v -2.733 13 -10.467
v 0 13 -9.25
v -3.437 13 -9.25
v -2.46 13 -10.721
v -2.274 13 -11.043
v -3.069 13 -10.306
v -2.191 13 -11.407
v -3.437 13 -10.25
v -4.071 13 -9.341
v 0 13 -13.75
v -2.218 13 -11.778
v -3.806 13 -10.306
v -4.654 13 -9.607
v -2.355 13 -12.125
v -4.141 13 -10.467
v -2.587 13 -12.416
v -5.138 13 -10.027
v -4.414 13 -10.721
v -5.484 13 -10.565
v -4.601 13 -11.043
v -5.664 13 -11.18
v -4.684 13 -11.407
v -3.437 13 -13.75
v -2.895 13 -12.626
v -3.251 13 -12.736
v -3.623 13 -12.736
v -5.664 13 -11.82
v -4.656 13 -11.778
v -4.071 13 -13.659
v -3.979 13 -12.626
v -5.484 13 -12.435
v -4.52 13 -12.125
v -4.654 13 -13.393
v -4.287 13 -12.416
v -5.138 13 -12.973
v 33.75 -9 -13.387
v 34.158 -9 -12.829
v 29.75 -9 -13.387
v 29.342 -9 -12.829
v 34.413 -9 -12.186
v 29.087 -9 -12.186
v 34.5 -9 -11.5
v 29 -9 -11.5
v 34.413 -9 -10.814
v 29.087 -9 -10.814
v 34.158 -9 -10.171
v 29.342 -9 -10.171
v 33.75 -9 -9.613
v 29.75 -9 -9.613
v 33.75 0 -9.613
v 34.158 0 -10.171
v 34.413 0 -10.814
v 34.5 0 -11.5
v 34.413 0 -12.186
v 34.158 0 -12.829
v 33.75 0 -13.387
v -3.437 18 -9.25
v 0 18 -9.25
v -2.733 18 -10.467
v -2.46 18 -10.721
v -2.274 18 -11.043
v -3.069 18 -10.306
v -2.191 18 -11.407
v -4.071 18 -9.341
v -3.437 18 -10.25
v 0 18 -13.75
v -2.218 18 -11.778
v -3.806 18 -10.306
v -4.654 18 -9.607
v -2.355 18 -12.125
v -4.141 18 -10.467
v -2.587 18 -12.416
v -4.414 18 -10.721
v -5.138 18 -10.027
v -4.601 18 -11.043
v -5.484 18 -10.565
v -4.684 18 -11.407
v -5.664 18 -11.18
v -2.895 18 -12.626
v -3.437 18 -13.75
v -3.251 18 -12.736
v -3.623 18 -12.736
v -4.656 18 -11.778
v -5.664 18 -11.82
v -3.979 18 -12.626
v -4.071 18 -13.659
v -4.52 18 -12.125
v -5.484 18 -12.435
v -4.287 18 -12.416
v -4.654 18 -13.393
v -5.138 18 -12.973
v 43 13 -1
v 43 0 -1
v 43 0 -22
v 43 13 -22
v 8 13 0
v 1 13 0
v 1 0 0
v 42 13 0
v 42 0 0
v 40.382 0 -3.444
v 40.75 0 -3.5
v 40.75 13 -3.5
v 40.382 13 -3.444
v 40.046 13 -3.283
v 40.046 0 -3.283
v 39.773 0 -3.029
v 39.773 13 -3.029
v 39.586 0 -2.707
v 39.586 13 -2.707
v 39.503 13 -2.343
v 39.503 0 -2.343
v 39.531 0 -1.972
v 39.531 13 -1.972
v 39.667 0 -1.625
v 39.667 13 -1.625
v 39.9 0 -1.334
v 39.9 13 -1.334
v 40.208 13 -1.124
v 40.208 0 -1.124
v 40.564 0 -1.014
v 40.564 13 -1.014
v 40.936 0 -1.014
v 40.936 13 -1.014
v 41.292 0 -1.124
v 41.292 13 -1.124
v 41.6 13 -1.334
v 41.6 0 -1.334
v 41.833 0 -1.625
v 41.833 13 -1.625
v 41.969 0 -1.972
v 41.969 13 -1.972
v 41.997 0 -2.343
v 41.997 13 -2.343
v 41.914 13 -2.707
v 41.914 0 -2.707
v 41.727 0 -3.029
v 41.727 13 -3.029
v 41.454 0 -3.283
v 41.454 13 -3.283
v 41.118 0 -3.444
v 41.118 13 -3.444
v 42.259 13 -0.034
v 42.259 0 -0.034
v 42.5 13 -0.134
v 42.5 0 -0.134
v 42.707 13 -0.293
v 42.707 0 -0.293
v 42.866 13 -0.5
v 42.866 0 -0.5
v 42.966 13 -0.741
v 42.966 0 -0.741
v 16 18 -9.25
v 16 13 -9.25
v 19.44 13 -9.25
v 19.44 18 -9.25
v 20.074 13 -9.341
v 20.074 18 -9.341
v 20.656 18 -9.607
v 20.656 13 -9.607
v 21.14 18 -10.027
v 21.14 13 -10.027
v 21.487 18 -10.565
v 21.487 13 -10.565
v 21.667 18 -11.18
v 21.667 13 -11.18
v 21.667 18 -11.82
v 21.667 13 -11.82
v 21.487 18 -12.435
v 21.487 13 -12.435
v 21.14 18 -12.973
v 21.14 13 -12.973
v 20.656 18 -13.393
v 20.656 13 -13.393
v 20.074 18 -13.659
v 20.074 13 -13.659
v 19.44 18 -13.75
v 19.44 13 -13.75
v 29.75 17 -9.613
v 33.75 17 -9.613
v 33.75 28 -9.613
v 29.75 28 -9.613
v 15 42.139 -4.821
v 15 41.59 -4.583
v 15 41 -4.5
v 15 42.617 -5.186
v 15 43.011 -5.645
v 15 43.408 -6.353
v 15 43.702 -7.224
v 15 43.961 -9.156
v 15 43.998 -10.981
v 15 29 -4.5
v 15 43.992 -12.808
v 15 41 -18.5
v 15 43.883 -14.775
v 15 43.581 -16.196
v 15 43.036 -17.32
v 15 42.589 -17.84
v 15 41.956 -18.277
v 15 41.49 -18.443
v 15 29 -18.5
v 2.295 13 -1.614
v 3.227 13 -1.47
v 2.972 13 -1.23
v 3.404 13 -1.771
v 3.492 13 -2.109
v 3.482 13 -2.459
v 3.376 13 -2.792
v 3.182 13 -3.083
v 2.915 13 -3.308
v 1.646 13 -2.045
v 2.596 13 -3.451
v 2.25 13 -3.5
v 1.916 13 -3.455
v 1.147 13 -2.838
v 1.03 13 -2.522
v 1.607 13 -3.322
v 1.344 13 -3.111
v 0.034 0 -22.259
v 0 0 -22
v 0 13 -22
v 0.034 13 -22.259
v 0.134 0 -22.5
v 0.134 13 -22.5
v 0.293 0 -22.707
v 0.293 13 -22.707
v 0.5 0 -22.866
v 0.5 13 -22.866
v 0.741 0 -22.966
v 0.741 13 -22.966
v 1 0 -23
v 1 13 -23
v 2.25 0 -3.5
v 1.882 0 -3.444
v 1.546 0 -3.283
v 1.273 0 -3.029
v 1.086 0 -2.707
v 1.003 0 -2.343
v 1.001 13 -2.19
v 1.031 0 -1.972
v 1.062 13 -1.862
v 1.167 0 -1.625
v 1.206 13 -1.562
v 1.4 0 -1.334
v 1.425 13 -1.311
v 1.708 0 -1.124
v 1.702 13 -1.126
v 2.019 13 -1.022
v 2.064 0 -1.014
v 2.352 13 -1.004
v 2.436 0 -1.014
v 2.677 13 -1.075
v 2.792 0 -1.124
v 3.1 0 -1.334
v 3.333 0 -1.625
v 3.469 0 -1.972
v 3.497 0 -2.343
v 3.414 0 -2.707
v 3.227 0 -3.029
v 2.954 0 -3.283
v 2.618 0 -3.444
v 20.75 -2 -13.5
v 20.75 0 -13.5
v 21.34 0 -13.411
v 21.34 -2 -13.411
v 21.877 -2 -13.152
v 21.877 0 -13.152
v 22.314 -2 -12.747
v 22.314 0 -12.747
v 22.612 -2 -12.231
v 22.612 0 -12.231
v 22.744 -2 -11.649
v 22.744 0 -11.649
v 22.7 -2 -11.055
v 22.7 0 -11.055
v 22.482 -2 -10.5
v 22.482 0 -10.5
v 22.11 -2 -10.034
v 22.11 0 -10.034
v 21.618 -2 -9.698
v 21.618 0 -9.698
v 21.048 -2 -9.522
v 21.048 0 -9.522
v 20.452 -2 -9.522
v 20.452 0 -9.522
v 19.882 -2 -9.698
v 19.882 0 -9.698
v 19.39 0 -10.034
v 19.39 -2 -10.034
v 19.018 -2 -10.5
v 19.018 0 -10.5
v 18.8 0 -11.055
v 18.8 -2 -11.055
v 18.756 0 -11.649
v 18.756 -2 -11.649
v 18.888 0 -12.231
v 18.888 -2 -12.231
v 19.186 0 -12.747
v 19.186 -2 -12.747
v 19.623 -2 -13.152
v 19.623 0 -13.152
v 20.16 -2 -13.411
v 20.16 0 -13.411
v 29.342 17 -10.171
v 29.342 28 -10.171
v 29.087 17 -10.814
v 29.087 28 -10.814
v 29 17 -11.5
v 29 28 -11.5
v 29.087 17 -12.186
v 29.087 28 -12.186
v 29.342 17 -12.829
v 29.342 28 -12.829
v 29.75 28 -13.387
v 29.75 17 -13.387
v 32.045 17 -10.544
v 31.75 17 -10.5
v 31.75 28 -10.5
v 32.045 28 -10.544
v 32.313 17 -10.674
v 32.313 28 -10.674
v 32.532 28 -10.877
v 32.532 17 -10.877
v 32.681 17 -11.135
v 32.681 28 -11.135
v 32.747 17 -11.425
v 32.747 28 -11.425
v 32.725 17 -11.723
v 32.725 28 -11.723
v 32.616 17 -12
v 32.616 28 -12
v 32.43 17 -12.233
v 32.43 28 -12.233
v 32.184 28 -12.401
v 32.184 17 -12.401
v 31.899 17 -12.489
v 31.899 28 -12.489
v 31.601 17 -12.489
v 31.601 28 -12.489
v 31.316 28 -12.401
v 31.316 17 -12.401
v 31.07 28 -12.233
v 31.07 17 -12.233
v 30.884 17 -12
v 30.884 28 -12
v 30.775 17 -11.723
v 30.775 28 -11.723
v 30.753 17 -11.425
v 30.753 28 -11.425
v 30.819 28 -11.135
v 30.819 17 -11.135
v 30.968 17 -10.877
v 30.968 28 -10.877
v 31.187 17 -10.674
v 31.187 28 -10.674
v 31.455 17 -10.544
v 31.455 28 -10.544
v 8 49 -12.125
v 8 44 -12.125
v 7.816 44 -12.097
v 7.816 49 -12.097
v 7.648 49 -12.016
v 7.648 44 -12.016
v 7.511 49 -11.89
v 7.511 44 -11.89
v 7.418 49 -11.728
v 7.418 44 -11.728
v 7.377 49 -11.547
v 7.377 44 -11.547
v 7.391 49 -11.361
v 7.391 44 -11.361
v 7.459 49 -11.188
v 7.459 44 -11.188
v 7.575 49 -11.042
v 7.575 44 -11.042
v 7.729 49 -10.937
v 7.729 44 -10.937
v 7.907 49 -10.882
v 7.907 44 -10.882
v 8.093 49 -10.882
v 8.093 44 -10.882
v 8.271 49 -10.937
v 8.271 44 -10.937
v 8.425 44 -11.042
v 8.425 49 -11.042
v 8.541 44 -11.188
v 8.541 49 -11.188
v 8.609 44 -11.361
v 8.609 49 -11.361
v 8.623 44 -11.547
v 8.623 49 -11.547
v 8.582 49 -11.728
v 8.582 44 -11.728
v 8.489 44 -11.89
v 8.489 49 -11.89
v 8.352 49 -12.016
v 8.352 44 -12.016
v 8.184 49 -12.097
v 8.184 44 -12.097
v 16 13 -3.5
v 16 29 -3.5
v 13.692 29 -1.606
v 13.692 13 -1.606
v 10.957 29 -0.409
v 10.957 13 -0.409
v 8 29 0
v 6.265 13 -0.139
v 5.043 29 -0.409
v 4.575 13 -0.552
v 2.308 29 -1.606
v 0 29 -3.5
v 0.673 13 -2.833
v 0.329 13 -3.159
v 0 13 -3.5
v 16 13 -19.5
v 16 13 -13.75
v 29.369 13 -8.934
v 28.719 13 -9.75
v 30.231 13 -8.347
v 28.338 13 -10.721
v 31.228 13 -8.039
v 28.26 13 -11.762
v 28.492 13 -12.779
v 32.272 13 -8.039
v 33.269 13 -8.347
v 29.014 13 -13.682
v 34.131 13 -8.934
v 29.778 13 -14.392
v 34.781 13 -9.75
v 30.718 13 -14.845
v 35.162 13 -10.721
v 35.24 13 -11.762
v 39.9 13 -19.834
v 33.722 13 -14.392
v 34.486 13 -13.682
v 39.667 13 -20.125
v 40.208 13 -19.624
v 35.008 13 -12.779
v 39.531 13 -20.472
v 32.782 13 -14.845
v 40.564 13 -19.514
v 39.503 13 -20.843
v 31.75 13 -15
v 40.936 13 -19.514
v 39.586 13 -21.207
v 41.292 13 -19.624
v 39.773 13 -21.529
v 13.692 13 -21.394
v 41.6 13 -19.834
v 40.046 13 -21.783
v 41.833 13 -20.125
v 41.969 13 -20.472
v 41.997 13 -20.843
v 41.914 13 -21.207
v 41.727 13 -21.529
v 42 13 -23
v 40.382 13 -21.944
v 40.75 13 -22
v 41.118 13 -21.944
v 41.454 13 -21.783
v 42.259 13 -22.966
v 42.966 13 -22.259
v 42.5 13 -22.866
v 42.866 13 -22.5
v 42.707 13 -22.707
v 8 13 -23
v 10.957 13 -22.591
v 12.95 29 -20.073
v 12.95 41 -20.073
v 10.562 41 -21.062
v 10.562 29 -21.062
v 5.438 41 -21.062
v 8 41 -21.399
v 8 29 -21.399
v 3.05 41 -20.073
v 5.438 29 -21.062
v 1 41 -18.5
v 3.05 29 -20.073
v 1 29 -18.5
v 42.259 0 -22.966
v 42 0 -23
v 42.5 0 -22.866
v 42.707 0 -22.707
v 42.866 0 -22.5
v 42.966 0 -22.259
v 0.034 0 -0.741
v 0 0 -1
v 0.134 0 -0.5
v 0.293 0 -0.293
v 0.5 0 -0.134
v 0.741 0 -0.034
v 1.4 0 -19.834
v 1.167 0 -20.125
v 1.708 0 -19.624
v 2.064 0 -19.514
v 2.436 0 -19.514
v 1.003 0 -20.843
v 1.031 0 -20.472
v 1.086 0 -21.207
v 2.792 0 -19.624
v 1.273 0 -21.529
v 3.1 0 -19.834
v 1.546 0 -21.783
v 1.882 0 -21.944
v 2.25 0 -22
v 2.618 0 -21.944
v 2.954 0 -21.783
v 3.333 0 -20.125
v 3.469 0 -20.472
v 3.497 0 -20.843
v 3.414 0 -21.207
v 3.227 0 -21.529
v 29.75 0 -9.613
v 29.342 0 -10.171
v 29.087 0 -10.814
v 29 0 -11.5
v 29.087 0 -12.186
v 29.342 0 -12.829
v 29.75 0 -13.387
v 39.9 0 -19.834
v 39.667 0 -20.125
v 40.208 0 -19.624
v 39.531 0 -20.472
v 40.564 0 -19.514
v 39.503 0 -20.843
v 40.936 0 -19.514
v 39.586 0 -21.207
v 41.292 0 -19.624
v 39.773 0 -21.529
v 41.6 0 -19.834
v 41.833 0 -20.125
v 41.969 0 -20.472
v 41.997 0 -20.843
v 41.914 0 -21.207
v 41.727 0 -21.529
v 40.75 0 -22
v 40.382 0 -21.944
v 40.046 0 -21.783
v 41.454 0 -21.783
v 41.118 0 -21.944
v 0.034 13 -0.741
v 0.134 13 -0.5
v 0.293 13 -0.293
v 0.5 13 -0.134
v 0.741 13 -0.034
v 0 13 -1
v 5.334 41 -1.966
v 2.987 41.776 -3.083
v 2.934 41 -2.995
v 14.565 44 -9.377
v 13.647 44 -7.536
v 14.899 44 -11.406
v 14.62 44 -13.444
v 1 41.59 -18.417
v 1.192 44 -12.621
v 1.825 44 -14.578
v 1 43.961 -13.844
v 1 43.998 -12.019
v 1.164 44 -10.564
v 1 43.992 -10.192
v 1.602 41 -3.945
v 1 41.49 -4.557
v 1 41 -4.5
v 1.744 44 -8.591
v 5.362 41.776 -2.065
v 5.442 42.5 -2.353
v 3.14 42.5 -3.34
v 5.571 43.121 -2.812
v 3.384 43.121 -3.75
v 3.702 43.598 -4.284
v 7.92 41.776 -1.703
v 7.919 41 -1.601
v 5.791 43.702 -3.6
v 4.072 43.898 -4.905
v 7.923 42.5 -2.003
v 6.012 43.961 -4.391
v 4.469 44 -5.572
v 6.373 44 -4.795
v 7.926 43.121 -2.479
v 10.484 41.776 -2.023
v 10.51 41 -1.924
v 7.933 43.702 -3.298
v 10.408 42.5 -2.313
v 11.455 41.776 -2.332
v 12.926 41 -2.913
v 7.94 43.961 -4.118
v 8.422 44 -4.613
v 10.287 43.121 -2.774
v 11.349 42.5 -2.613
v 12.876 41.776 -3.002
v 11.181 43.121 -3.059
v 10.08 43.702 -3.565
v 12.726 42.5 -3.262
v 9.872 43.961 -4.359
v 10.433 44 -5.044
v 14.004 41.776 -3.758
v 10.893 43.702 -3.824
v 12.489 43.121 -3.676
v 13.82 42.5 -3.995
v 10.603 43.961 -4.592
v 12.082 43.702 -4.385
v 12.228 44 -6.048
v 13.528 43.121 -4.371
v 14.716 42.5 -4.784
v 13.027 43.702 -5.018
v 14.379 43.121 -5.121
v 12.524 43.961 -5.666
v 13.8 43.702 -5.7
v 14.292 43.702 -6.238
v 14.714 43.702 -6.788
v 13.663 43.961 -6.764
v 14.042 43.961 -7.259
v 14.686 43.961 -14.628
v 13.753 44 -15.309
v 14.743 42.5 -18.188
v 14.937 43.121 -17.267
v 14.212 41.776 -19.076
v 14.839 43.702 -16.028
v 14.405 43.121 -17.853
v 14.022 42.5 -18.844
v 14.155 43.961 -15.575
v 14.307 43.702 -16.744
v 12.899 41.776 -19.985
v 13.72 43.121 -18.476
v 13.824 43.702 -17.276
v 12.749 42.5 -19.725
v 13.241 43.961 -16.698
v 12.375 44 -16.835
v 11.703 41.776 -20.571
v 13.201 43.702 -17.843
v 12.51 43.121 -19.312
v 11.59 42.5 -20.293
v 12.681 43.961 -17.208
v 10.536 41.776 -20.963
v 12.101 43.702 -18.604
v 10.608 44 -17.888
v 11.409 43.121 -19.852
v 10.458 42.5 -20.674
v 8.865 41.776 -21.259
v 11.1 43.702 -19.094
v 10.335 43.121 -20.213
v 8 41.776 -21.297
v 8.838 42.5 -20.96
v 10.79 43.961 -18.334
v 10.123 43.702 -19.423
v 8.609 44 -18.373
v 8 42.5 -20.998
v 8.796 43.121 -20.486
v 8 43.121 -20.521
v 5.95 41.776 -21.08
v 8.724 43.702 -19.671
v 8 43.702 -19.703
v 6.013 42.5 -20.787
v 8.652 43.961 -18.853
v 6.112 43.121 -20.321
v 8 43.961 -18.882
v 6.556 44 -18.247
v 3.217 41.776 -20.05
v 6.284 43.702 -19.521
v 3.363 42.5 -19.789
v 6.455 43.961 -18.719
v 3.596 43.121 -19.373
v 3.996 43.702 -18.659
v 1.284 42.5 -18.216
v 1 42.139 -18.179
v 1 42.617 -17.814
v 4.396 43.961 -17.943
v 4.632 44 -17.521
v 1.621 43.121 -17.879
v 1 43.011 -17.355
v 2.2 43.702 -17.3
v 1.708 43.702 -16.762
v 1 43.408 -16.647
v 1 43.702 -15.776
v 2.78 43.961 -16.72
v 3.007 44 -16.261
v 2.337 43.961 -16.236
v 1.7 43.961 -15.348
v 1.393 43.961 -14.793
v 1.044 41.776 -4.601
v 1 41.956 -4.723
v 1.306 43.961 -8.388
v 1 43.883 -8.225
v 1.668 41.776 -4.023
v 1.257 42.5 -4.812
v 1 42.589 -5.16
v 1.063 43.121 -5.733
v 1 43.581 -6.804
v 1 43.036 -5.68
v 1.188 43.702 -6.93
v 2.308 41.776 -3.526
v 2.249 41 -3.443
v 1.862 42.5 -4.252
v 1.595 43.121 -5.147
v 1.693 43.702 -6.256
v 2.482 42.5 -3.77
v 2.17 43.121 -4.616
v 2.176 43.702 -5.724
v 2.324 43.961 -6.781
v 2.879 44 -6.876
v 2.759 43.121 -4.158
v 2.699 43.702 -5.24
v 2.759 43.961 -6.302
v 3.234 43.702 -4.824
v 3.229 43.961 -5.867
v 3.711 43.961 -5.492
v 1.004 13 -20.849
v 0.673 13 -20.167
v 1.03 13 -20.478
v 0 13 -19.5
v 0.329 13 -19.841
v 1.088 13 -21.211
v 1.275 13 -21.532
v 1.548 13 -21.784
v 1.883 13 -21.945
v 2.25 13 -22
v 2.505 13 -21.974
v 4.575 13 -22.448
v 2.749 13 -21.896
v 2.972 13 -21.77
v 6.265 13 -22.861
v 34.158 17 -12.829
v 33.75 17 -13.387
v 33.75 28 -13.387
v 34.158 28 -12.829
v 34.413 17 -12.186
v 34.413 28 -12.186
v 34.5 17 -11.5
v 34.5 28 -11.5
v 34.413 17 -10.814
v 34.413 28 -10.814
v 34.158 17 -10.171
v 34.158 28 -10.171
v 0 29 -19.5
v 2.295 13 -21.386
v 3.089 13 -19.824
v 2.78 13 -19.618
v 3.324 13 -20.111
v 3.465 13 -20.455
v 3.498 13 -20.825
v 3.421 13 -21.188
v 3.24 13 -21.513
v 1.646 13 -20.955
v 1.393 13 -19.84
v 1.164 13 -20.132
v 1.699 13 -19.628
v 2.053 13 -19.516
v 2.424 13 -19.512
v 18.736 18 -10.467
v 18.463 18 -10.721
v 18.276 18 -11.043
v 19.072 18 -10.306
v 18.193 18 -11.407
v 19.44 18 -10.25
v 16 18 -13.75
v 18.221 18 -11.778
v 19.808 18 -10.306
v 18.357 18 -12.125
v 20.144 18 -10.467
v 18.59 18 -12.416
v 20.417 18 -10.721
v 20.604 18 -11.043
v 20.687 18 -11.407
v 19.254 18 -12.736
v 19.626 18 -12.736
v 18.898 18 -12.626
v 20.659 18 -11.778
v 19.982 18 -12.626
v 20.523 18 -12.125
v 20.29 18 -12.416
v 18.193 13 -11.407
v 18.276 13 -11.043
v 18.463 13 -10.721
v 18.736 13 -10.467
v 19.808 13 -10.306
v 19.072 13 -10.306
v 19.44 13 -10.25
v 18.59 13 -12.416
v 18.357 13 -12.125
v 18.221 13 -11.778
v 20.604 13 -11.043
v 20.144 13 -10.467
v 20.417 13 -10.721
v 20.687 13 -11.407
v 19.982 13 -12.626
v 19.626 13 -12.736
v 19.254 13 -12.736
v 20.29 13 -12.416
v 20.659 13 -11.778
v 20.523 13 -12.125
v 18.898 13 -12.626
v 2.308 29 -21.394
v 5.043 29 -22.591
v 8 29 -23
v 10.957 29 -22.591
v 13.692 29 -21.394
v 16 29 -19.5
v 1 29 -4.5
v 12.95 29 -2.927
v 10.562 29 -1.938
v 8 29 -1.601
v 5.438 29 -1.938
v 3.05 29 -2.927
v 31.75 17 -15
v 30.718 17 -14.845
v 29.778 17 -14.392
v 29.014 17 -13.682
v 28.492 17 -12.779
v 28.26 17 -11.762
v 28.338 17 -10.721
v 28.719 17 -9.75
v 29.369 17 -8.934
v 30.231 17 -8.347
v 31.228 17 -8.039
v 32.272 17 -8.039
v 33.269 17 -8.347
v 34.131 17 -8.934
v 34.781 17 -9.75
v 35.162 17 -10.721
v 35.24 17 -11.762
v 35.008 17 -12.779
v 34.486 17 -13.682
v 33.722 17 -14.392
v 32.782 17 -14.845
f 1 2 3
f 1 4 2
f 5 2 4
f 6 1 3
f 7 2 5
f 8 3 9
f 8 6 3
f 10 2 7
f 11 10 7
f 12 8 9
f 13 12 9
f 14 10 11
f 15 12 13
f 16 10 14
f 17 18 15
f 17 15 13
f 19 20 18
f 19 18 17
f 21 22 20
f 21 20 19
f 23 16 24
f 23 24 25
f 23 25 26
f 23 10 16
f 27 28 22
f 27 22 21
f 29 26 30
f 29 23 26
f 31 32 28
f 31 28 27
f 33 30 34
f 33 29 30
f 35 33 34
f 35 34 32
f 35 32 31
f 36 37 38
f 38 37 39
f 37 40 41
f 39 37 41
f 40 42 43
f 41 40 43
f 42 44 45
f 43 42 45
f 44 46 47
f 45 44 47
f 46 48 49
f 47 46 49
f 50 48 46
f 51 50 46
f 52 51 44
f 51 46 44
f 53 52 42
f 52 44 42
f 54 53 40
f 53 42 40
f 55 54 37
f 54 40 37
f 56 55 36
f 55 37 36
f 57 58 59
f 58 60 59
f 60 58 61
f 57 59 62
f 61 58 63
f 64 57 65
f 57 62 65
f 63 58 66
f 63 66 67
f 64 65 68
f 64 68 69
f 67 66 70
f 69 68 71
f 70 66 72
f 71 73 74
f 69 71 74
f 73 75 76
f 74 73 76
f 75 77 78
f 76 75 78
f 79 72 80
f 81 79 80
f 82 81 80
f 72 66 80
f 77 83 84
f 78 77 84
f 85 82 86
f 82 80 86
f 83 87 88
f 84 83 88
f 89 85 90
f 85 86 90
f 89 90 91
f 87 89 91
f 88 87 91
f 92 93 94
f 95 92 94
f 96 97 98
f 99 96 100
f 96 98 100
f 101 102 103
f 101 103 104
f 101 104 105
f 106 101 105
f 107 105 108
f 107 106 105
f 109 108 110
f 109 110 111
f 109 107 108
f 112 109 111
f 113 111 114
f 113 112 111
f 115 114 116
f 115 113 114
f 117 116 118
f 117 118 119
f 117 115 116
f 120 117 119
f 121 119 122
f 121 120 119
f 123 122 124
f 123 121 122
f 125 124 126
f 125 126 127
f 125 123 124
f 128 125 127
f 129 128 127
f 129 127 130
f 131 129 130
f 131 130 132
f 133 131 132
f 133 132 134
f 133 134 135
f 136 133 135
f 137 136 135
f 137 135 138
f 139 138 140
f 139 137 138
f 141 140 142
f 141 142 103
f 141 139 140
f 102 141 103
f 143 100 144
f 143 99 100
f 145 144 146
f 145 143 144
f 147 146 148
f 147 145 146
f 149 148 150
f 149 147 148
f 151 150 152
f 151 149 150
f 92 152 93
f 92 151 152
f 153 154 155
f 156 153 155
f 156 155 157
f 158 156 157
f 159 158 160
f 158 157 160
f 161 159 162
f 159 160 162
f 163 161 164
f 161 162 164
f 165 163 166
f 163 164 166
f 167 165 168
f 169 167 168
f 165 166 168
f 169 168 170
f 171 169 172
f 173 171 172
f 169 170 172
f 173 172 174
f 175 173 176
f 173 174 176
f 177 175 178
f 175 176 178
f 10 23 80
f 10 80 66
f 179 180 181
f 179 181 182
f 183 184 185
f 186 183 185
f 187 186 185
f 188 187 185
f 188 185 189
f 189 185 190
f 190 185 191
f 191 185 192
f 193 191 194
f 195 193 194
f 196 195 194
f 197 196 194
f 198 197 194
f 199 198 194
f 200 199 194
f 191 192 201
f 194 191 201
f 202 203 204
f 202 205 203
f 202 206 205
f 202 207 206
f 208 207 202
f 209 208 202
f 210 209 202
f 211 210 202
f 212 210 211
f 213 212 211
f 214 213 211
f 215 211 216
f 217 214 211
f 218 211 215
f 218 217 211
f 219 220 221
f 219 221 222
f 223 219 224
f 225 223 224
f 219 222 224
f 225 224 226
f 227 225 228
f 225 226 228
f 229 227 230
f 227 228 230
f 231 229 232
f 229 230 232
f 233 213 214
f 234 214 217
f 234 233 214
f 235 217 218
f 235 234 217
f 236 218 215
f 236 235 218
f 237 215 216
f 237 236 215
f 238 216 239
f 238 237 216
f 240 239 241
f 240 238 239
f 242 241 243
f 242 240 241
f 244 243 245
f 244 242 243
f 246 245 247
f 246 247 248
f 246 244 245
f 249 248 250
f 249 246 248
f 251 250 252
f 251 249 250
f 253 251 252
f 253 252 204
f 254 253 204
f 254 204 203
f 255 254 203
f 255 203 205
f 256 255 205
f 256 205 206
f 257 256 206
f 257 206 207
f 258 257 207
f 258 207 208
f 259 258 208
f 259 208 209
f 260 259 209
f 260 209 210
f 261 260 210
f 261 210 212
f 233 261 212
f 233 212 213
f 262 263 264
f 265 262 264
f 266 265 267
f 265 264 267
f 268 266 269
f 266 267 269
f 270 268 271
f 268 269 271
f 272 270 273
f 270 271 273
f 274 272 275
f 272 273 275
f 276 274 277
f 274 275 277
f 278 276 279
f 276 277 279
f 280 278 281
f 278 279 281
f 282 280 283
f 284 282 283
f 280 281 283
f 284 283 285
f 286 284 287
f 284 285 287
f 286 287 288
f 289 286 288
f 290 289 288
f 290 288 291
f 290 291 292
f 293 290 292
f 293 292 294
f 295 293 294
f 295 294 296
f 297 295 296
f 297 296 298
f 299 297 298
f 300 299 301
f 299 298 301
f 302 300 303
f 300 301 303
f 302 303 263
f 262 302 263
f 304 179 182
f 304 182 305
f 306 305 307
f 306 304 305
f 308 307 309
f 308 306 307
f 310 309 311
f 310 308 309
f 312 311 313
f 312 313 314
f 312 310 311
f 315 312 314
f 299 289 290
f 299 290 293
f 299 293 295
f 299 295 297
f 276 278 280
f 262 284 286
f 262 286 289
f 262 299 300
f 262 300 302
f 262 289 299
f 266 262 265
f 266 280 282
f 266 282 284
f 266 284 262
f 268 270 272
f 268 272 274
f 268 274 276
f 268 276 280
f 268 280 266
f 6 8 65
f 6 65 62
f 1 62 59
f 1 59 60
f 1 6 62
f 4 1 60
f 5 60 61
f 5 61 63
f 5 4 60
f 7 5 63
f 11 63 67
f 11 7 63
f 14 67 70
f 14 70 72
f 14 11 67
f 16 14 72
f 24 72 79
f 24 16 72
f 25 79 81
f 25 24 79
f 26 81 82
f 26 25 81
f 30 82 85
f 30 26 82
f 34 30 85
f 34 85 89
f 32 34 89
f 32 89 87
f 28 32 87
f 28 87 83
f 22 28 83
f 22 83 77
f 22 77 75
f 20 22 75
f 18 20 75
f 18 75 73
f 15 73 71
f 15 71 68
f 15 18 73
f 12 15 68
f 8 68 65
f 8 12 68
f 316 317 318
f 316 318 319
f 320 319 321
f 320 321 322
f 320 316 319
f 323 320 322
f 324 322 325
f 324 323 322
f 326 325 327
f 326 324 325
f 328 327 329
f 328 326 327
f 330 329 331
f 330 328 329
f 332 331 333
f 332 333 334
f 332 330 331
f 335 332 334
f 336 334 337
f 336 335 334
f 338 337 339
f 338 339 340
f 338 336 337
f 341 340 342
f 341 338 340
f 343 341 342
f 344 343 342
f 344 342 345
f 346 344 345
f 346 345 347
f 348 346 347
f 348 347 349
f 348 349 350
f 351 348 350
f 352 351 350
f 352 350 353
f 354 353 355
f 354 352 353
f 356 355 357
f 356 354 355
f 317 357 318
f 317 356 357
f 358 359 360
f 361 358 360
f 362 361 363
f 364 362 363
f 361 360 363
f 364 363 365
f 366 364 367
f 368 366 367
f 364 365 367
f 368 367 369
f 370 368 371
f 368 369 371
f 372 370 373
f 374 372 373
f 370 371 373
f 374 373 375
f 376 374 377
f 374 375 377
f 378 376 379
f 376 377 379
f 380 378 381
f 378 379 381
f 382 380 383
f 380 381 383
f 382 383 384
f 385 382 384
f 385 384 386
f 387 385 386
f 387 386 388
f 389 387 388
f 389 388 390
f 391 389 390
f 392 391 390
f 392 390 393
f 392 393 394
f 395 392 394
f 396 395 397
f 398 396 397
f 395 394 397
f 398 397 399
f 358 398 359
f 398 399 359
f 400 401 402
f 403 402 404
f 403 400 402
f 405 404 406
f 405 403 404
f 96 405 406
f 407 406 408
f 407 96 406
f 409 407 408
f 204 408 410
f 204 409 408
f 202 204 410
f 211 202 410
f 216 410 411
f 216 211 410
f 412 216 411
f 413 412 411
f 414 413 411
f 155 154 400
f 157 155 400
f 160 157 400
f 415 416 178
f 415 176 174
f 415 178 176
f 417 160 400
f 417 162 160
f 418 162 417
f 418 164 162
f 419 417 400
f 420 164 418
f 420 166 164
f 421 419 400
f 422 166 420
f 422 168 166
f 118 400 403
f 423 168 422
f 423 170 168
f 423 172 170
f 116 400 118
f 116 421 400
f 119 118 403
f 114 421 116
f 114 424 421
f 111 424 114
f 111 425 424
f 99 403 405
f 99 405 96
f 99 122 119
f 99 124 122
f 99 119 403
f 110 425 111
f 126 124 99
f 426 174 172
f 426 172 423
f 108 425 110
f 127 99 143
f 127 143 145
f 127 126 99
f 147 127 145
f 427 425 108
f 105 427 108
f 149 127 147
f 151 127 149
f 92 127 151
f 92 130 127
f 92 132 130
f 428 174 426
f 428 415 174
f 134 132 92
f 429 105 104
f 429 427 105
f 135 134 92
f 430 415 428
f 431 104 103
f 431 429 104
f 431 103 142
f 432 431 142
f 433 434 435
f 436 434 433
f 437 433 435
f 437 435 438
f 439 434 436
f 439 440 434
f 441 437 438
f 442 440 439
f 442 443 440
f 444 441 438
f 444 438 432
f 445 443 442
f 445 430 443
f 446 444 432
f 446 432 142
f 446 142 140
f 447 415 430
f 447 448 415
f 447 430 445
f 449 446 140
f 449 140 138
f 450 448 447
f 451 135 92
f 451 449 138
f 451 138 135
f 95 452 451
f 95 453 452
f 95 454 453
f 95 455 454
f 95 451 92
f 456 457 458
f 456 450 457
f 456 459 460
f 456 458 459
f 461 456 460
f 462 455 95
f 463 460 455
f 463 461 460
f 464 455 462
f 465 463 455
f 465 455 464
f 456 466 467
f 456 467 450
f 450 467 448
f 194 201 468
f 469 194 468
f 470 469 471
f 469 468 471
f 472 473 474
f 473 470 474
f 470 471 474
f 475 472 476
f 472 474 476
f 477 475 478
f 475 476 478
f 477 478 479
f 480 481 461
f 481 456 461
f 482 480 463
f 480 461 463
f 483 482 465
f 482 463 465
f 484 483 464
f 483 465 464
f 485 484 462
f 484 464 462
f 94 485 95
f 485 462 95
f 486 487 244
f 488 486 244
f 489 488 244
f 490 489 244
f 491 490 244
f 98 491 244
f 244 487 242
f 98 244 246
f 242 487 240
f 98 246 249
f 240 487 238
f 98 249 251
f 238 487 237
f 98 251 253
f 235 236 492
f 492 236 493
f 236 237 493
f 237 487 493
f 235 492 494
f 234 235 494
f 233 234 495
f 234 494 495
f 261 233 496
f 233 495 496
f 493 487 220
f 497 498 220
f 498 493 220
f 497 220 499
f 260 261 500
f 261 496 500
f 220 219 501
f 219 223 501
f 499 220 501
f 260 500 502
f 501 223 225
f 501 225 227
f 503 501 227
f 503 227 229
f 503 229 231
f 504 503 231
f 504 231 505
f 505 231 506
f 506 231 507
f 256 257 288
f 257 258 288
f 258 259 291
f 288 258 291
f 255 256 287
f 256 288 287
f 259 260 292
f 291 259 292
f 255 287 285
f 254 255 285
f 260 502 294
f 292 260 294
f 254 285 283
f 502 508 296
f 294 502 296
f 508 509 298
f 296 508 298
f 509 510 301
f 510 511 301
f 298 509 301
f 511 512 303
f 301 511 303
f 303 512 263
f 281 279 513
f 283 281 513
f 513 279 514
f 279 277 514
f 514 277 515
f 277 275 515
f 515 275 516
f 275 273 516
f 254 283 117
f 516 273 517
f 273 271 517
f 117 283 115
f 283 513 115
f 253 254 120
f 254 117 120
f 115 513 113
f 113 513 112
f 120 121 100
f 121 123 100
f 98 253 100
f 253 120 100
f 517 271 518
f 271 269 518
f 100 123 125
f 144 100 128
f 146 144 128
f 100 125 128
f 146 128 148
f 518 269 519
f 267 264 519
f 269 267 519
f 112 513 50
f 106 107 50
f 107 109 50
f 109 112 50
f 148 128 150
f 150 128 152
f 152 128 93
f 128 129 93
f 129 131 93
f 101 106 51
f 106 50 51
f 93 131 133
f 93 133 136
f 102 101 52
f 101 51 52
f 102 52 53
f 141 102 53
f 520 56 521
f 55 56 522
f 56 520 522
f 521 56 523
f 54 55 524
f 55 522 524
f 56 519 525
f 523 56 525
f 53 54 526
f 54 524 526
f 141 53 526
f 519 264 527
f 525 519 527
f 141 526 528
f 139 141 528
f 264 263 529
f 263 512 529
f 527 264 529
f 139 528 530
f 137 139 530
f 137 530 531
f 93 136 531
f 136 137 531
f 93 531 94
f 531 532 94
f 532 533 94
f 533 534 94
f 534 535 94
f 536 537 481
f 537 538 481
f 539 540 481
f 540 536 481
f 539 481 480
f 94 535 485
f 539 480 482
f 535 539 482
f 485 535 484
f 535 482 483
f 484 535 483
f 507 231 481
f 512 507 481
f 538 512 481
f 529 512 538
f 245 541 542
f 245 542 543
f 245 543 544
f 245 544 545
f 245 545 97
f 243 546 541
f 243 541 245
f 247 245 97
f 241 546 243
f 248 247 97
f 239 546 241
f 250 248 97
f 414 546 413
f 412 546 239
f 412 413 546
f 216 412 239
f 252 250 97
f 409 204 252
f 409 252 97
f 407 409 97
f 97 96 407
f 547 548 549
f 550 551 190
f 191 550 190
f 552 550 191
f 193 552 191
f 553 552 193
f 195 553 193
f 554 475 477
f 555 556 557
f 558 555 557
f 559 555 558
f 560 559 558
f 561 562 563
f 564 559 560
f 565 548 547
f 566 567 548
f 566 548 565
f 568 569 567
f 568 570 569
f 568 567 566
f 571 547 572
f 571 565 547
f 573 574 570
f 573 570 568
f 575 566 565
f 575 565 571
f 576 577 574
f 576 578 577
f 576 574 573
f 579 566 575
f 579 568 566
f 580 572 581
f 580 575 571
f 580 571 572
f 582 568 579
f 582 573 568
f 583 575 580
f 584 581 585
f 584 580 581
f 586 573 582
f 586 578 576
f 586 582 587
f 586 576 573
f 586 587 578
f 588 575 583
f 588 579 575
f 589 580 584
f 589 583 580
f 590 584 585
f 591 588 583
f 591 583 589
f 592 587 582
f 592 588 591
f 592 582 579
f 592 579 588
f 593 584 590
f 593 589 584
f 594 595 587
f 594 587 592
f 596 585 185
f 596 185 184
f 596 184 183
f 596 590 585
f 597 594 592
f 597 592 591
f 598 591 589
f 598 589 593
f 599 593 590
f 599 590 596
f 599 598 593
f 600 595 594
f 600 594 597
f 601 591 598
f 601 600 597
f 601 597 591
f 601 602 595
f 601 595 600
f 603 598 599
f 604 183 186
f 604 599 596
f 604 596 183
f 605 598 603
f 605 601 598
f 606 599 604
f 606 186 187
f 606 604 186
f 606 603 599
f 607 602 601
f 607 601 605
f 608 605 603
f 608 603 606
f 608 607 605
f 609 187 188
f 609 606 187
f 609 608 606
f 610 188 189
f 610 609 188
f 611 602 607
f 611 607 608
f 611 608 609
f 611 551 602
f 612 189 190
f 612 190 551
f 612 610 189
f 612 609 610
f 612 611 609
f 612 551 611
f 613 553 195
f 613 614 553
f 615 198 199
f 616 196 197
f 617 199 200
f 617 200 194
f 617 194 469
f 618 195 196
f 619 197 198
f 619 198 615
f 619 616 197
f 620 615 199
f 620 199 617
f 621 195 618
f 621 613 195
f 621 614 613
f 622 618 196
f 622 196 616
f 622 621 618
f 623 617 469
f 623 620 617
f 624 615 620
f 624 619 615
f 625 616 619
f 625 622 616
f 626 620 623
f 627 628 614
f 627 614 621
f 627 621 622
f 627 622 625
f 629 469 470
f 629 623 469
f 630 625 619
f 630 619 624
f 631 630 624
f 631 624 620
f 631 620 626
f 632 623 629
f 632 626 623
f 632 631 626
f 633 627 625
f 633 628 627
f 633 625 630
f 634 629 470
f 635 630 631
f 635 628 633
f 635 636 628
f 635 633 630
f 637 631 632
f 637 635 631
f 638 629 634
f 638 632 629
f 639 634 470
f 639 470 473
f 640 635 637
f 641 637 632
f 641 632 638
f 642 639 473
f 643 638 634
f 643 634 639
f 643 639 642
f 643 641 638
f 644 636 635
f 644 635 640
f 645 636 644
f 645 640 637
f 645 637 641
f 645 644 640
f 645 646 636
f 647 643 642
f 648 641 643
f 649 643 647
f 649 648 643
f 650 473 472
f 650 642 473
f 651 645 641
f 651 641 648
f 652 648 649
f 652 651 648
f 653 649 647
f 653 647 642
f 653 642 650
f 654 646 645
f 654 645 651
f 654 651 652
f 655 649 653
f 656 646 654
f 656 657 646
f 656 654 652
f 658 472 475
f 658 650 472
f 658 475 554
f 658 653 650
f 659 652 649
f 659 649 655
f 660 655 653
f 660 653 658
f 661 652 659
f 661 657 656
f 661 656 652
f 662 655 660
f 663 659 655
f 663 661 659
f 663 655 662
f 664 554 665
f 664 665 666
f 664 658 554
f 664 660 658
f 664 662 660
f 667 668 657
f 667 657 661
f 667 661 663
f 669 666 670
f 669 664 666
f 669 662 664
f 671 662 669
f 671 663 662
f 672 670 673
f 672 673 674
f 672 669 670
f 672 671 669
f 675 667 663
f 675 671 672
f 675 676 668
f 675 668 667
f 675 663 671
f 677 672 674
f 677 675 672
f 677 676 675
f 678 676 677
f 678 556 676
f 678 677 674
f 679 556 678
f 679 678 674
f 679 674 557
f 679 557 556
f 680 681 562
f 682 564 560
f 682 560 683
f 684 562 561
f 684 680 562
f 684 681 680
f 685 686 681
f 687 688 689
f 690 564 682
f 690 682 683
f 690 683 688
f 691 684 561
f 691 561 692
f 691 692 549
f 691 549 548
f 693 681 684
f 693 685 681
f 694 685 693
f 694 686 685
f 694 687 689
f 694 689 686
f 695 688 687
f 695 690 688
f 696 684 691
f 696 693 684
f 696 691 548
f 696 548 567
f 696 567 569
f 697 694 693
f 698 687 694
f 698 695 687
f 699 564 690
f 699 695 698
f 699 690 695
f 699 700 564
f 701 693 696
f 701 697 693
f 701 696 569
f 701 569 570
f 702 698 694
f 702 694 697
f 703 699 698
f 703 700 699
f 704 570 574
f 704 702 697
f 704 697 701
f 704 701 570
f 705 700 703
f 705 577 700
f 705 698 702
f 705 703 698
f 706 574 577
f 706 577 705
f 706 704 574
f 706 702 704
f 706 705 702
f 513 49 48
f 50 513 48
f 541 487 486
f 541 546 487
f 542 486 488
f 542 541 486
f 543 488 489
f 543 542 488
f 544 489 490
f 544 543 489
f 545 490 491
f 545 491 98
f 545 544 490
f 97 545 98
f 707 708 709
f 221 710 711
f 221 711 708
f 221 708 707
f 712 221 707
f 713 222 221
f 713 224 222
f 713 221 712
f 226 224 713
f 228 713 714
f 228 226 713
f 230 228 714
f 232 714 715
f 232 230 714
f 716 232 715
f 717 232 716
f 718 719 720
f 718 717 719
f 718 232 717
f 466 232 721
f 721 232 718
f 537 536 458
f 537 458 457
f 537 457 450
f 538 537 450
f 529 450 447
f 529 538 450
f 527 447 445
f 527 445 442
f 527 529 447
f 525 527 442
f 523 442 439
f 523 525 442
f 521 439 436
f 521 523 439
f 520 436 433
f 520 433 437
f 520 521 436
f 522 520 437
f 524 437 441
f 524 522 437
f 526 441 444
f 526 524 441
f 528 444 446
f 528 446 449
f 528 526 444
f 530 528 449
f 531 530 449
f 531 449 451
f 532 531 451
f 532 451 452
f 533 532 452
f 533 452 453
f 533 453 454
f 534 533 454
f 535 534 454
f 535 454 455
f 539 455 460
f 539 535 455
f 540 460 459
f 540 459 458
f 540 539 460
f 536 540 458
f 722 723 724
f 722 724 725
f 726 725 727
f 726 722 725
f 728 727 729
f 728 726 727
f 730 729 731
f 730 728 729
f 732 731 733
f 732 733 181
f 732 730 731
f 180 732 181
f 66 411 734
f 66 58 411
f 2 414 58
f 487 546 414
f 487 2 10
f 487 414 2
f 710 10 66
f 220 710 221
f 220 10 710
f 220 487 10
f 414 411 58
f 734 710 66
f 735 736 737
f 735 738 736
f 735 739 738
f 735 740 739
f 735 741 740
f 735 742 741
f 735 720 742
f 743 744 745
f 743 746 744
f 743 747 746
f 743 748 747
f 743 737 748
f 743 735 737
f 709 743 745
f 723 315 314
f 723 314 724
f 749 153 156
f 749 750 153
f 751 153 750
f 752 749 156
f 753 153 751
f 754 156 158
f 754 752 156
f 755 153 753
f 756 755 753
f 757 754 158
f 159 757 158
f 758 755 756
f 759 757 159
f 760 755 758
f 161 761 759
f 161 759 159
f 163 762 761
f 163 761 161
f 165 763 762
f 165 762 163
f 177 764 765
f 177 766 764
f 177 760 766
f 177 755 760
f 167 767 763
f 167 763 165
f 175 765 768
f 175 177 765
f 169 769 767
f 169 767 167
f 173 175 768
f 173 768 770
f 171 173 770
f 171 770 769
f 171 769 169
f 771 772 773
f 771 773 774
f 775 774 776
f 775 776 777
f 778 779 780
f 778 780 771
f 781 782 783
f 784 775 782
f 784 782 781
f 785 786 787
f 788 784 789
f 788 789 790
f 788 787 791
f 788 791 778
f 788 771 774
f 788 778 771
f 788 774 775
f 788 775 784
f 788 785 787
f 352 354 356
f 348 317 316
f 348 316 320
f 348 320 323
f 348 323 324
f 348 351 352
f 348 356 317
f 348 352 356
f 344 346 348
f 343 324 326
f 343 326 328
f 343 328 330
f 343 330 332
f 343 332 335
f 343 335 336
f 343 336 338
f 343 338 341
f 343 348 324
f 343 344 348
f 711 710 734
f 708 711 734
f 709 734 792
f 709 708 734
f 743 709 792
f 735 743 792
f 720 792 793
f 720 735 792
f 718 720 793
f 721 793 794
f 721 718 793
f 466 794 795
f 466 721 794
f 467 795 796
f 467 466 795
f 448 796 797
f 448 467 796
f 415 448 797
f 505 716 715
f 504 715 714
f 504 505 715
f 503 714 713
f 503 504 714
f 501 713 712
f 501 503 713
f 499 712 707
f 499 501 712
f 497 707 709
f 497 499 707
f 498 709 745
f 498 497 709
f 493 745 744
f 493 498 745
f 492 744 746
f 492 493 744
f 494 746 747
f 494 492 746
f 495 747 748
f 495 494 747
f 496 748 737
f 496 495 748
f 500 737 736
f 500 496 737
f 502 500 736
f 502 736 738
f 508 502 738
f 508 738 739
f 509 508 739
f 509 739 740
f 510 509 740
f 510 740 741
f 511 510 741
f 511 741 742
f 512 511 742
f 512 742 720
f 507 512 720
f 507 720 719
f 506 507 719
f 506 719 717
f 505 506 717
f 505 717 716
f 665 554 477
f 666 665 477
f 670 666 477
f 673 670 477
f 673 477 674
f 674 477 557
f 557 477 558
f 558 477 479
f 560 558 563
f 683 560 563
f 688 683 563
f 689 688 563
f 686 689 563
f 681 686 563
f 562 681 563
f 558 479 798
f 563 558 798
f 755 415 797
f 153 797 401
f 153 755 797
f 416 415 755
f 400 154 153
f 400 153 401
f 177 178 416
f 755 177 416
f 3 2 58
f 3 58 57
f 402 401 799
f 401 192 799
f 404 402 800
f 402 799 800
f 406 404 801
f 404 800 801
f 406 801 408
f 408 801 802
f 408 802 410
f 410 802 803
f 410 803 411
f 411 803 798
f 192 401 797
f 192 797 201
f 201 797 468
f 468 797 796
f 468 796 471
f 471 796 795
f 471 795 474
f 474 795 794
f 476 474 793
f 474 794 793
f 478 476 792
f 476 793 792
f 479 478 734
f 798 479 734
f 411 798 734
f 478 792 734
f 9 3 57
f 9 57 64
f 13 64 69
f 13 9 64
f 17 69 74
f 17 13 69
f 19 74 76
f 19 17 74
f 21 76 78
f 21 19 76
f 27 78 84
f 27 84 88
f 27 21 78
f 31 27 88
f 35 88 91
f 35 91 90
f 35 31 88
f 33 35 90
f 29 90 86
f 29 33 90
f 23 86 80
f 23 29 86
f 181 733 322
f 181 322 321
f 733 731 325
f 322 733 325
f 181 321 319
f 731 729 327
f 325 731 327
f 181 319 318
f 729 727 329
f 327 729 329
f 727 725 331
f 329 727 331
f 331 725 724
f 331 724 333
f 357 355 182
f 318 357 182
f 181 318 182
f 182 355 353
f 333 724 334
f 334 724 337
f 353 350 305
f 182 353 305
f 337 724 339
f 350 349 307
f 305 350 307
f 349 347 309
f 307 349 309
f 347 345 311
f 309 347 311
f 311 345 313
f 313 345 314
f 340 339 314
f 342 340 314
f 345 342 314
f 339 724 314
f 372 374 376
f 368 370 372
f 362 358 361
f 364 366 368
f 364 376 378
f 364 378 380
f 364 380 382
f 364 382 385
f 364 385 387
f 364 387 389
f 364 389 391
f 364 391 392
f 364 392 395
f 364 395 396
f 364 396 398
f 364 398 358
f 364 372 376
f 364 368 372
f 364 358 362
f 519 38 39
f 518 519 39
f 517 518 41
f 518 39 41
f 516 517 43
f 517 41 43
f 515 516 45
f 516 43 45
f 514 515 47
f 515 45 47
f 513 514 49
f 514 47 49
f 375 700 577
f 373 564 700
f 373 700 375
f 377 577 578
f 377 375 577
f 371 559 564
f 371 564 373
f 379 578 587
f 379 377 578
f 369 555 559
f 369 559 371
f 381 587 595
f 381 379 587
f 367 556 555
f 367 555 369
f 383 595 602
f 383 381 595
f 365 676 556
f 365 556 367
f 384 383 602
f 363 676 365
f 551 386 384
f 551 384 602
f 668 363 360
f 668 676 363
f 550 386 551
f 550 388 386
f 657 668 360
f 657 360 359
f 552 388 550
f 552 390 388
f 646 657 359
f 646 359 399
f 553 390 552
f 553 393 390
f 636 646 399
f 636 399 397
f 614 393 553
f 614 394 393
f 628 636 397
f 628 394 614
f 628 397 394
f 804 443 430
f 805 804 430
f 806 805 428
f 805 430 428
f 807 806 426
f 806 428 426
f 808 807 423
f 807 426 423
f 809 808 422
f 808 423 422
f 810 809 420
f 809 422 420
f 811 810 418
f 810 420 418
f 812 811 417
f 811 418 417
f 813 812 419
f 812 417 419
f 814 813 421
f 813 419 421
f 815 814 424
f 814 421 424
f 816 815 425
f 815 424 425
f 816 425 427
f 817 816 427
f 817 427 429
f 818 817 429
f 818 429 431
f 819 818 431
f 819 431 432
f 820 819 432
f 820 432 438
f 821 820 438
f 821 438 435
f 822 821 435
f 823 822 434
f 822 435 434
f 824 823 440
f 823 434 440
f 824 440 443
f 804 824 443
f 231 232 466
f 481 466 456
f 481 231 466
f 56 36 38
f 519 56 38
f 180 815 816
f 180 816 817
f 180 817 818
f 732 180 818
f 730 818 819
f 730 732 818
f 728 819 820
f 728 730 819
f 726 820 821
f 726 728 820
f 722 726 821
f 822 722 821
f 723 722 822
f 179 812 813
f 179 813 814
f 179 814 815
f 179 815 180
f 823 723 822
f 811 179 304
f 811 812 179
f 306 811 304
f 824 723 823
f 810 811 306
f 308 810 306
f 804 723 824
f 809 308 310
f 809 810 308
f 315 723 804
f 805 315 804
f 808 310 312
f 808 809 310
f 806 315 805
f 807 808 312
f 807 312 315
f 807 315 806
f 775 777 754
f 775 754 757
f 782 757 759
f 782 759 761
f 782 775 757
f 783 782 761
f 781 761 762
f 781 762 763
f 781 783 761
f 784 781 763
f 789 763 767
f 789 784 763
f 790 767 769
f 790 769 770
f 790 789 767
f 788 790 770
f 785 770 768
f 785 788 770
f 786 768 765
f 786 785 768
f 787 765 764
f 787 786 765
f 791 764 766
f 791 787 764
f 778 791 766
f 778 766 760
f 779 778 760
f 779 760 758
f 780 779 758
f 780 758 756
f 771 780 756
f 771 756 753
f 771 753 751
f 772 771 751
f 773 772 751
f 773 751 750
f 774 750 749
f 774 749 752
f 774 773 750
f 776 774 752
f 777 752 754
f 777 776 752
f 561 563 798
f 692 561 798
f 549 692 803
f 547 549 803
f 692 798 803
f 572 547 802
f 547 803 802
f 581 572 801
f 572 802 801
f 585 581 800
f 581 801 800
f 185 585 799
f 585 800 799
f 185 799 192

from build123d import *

# Parameters (mm, degrees)
SKETCH2_W            = 43
SKETCH2_H            = 23
SKETCH2_R            = 1.25
BOSS_EXTRUDE1_DEPTH  = 13
FILLET1_R            = 1
BOSS_EXTRUDE2_DEPTH  = 16
BOSS_EXTRUDE3_DEPTH  = 15
SKETCH5_R            = 0.625
BOSS_EXTRUDE4_DEPTH  = 5
FILLET2_R            = 3
SKETCH6_R            = 3.5
BOSS_EXTRUDE5_DEPTH  = 4
SKETCH7_R            = 1
BOSS_EXTRUDE7_DEPTH  = 11
SKETCH8_R            = 1.25
BOSS_EXTRUDE8_DEPTH  = 5
BOSS_EXTRUDE9_START  = 9
BOSS_EXTRUDE9_DEPTH  = 9
SKETCH10_R           = 2
BOSS_EXTRUDE10_DEPTH = 2


with BuildPart() as part:
    # Sketch2 → Boss-Extrude1 (new body)
    with BuildSketch(Plane(origin=(0, 0, 0), x_dir=(1, 0, 0), z_dir=(0, 1, 0))):
        with Locations((21.5, 11.5)):
            Rectangle(SKETCH2_W, SKETCH2_H)
        with Locations(Location((2.25, 20.75, 0), (0, 0, 90))):
            Circle(SKETCH2_R, mode=Mode.SUBTRACT)
        with Locations(Location((40.75, 20.75, 0), (0, 0, 90))):
            Circle(SKETCH2_R, mode=Mode.SUBTRACT)
        with Locations(Location((40.75, 2.25, 0), (0, 0, 90))):
            Circle(SKETCH2_R, mode=Mode.SUBTRACT)
        with Locations(Location((2.25, 2.25, 0), (0, 0, 90))):
            Circle(SKETCH2_R, mode=Mode.SUBTRACT)
    extrude(amount=BOSS_EXTRUDE1_DEPTH)

    # Fillet1
    fillet1_edges = [part.edges().sort_by_distance(p)[0] for p in [
        (0, 6.5, -23),
        (43, 6.5, -23),
        (43, 6.5, 0),
        (0, 6.5, 0),
    ]]
    fillet(fillet1_edges, radius=FILLET1_R)

    # Sketch3 → Boss-Extrude2 (add)
    with BuildSketch(Plane(origin=(0, 13, 0), x_dir=(1, 0, 0), z_dir=(0, 1, 0))):
        with BuildLine():
            Line((16, 19.5), (16, 3.5))
            ThreePointArc((16, 3.5), (8, 0), (0, 3.5))
            Line((0, 3.5), (0, 19.5))
            ThreePointArc((0, 19.5), (8, 23), (16, 19.5))
        make_face()
    extrude(amount=BOSS_EXTRUDE2_DEPTH)

    # Sketch4 → Boss-Extrude3 (add)
    with BuildSketch(Plane(origin=(0, 29, 0), x_dir=(1, 0, 0), z_dir=(0, 1, 0))):
        with BuildLine():
            Line((1, 18.5), (1, 4.5))
            ThreePointArc((1, 4.5), (8, 1.600505063), (15, 4.5))
            Line((15, 4.5), (15, 18.5))
            ThreePointArc((15, 18.5), (8, 21.399494937), (1, 18.5))
        make_face()
    extrude(amount=BOSS_EXTRUDE3_DEPTH)

    # Sketch5 → Boss-Extrude4 (add)
    with BuildSketch(Plane(origin=(0, 44, 0), x_dir=(1, 0, 0), z_dir=(0, 1, 0))):
        with Locations(Location((8, 11.5, 0), (0, 0, 90))):
            Circle(SKETCH5_R)
    extrude(amount=BOSS_EXTRUDE4_DEPTH)

    # Fillet2
    # the kernel refuses this fillet: 3 mm, written as the material it takes off along each edge
    with BuildSketch(Plane(origin=(8, 44, -11.5), x_dir=(0.5117233691003439, 0, 0.8591502741177431), z_dir=(-0.8591502741177431, 0, 0.5117233691003439))) as fillet2_piece_1:
        with BuildLine():
            CenterArc((9.899494937 - FILLET2_R, -FILLET2_R), FILLET2_R, 0, 90)
            Line((9.899494937 - FILLET2_R, 0), (9.899494937 - FILLET2_R, FILLET2_R * 0.02))
            Line((9.899494937 - FILLET2_R, FILLET2_R * 0.02), (9.899494937 + FILLET2_R * 0.02, FILLET2_R * 0.02))
            Line((9.899494937 + FILLET2_R * 0.02, FILLET2_R * 0.02), (9.899494937 + FILLET2_R * 0.02, -FILLET2_R))
            Line((9.899494937 + FILLET2_R * 0.02, -FILLET2_R), (9.899494937, -FILLET2_R))
        make_face()
    revolve(axis=Axis((8, 44, -11.5), (0, 1, 0)), revolution_arc=298.442618359, mode=Mode.SUBTRACT)
    with BuildSketch(Plane(origin=(8, 44, -11.5), x_dir=(-0.5117233691003458, 0, -0.859150274117742), z_dir=(0.859150274117742, 0, -0.5117233691003458))) as fillet2_piece_2:
        with BuildLine():
            CenterArc((9.899494937 - FILLET2_R, -FILLET2_R), FILLET2_R, 0, 90)
            Line((9.899494937 - FILLET2_R, 0), (9.899494937 - FILLET2_R, FILLET2_R * 0.02))
            Line((9.899494937 - FILLET2_R, FILLET2_R * 0.02), (9.899494937 + FILLET2_R * 0.02, FILLET2_R * 0.02))
            Line((9.899494937 + FILLET2_R * 0.02, FILLET2_R * 0.02), (9.899494937 + FILLET2_R * 0.02, -FILLET2_R))
            Line((9.899494937 + FILLET2_R * 0.02, -FILLET2_R), (9.899494937, -FILLET2_R))
        make_face()
    revolve(axis=Axis((8, 44, -11.5), (0, 1, 0)), revolution_arc=298.442618359, mode=Mode.SUBTRACT)

    # Sketch6 → Boss-Extrude5 (add)
    with BuildSketch(Plane(origin=(0, 13, 0), x_dir=(1, 0, 0), z_dir=(0, 1, 0))):
        with Locations(Location((31.75, 11.5, 0), (0, 0, 90))):
            Circle(SKETCH6_R)
    extrude(amount=BOSS_EXTRUDE5_DEPTH)

    # Sketch7 → Boss-Extrude7 (add)
    with BuildSketch(Plane(origin=(0, 17, 0), x_dir=(1, 0, 0), z_dir=(0, 1, 0))):
        with BuildLine():
            Line((29.75, 13.387458609), (33.75, 13.387458609))
            ThreePointArc((33.75, 13.387458609), (34.5, 11.5), (33.75, 9.612541391))
            Line((33.75, 9.612541391), (29.75, 9.612541391))
            ThreePointArc((29.75, 9.612541391), (29, 11.5), (29.75, 13.387458609))
        make_face()
        with Locations(Location((31.75, 11.5, 0), (0, 0, 270))):
            Circle(SKETCH7_R, mode=Mode.SUBTRACT)
    extrude(amount=BOSS_EXTRUDE7_DEPTH)

    # Sketch8 → Boss-Extrude8 (add)
    # profile 1 of 2: a face of its own
    with BuildSketch(Plane(origin=(0, 13, 0), x_dir=(1, 0, 0), z_dir=(0, 1, 0))):
        with BuildLine():
            Line((-3.437113108, 13.75), (0, 13.75))
            Line((0, 13.75), (0, 9.25))
            Line((0, 9.25), (-3.437113108, 9.25))
            ThreePointArc((-3.437113108, 9.25), (-5.687113108, 11.5), (-3.437113108, 13.75))
        make_face()
        with Locations(Location((-3.437113108, 11.5, 0), (0, 0, 270))):
            Circle(SKETCH8_R, mode=Mode.SUBTRACT)
    # profile 2 of 2: a face of its own
    with BuildSketch(Plane(origin=(0, 13, 0), x_dir=(1, 0, 0), z_dir=(0, 1, 0))):
        with BuildLine():
            Line((16, 9.25), (19.44, 9.25))
            ThreePointArc((19.44, 9.25), (21.69, 11.5), (19.44, 13.75))
            Line((19.44, 13.75), (16, 13.75))
            Line((16, 13.75), (16, 9.25))
        make_face()
        with Locations(Location((19.44, 11.5, 0), (0, 0, 270))):
            Circle(SKETCH8_R, mode=Mode.SUBTRACT)
    extrude(amount=BOSS_EXTRUDE8_DEPTH)

    # Sketch9 → Boss-Extrude9 (add)
    with BuildSketch(Plane.XZ.offset(BOSS_EXTRUDE9_START)):
        with BuildLine():
            Line((33.75, -13.387458609), (29.75, -13.387458609))
            ThreePointArc((29.75, -13.387458609), (29, -11.5), (29.75, -9.612541391))
            Line((29.75, -9.612541391), (33.75, -9.612541391))
            ThreePointArc((33.75, -9.612541391), (34.5, -11.5), (33.75, -13.387458609))
        make_face()
    extrude(amount=-BOSS_EXTRUDE9_DEPTH)

    # Sketch10 → Boss-Extrude10 (add)
    with BuildSketch(Plane.XZ):
        with Locations(Location((20.75, -11.5, 0), (0, 0, 270))):
            Circle(SKETCH10_R)
    extrude(amount=BOSS_EXTRUDE10_DEPTH)


solid = part.part
